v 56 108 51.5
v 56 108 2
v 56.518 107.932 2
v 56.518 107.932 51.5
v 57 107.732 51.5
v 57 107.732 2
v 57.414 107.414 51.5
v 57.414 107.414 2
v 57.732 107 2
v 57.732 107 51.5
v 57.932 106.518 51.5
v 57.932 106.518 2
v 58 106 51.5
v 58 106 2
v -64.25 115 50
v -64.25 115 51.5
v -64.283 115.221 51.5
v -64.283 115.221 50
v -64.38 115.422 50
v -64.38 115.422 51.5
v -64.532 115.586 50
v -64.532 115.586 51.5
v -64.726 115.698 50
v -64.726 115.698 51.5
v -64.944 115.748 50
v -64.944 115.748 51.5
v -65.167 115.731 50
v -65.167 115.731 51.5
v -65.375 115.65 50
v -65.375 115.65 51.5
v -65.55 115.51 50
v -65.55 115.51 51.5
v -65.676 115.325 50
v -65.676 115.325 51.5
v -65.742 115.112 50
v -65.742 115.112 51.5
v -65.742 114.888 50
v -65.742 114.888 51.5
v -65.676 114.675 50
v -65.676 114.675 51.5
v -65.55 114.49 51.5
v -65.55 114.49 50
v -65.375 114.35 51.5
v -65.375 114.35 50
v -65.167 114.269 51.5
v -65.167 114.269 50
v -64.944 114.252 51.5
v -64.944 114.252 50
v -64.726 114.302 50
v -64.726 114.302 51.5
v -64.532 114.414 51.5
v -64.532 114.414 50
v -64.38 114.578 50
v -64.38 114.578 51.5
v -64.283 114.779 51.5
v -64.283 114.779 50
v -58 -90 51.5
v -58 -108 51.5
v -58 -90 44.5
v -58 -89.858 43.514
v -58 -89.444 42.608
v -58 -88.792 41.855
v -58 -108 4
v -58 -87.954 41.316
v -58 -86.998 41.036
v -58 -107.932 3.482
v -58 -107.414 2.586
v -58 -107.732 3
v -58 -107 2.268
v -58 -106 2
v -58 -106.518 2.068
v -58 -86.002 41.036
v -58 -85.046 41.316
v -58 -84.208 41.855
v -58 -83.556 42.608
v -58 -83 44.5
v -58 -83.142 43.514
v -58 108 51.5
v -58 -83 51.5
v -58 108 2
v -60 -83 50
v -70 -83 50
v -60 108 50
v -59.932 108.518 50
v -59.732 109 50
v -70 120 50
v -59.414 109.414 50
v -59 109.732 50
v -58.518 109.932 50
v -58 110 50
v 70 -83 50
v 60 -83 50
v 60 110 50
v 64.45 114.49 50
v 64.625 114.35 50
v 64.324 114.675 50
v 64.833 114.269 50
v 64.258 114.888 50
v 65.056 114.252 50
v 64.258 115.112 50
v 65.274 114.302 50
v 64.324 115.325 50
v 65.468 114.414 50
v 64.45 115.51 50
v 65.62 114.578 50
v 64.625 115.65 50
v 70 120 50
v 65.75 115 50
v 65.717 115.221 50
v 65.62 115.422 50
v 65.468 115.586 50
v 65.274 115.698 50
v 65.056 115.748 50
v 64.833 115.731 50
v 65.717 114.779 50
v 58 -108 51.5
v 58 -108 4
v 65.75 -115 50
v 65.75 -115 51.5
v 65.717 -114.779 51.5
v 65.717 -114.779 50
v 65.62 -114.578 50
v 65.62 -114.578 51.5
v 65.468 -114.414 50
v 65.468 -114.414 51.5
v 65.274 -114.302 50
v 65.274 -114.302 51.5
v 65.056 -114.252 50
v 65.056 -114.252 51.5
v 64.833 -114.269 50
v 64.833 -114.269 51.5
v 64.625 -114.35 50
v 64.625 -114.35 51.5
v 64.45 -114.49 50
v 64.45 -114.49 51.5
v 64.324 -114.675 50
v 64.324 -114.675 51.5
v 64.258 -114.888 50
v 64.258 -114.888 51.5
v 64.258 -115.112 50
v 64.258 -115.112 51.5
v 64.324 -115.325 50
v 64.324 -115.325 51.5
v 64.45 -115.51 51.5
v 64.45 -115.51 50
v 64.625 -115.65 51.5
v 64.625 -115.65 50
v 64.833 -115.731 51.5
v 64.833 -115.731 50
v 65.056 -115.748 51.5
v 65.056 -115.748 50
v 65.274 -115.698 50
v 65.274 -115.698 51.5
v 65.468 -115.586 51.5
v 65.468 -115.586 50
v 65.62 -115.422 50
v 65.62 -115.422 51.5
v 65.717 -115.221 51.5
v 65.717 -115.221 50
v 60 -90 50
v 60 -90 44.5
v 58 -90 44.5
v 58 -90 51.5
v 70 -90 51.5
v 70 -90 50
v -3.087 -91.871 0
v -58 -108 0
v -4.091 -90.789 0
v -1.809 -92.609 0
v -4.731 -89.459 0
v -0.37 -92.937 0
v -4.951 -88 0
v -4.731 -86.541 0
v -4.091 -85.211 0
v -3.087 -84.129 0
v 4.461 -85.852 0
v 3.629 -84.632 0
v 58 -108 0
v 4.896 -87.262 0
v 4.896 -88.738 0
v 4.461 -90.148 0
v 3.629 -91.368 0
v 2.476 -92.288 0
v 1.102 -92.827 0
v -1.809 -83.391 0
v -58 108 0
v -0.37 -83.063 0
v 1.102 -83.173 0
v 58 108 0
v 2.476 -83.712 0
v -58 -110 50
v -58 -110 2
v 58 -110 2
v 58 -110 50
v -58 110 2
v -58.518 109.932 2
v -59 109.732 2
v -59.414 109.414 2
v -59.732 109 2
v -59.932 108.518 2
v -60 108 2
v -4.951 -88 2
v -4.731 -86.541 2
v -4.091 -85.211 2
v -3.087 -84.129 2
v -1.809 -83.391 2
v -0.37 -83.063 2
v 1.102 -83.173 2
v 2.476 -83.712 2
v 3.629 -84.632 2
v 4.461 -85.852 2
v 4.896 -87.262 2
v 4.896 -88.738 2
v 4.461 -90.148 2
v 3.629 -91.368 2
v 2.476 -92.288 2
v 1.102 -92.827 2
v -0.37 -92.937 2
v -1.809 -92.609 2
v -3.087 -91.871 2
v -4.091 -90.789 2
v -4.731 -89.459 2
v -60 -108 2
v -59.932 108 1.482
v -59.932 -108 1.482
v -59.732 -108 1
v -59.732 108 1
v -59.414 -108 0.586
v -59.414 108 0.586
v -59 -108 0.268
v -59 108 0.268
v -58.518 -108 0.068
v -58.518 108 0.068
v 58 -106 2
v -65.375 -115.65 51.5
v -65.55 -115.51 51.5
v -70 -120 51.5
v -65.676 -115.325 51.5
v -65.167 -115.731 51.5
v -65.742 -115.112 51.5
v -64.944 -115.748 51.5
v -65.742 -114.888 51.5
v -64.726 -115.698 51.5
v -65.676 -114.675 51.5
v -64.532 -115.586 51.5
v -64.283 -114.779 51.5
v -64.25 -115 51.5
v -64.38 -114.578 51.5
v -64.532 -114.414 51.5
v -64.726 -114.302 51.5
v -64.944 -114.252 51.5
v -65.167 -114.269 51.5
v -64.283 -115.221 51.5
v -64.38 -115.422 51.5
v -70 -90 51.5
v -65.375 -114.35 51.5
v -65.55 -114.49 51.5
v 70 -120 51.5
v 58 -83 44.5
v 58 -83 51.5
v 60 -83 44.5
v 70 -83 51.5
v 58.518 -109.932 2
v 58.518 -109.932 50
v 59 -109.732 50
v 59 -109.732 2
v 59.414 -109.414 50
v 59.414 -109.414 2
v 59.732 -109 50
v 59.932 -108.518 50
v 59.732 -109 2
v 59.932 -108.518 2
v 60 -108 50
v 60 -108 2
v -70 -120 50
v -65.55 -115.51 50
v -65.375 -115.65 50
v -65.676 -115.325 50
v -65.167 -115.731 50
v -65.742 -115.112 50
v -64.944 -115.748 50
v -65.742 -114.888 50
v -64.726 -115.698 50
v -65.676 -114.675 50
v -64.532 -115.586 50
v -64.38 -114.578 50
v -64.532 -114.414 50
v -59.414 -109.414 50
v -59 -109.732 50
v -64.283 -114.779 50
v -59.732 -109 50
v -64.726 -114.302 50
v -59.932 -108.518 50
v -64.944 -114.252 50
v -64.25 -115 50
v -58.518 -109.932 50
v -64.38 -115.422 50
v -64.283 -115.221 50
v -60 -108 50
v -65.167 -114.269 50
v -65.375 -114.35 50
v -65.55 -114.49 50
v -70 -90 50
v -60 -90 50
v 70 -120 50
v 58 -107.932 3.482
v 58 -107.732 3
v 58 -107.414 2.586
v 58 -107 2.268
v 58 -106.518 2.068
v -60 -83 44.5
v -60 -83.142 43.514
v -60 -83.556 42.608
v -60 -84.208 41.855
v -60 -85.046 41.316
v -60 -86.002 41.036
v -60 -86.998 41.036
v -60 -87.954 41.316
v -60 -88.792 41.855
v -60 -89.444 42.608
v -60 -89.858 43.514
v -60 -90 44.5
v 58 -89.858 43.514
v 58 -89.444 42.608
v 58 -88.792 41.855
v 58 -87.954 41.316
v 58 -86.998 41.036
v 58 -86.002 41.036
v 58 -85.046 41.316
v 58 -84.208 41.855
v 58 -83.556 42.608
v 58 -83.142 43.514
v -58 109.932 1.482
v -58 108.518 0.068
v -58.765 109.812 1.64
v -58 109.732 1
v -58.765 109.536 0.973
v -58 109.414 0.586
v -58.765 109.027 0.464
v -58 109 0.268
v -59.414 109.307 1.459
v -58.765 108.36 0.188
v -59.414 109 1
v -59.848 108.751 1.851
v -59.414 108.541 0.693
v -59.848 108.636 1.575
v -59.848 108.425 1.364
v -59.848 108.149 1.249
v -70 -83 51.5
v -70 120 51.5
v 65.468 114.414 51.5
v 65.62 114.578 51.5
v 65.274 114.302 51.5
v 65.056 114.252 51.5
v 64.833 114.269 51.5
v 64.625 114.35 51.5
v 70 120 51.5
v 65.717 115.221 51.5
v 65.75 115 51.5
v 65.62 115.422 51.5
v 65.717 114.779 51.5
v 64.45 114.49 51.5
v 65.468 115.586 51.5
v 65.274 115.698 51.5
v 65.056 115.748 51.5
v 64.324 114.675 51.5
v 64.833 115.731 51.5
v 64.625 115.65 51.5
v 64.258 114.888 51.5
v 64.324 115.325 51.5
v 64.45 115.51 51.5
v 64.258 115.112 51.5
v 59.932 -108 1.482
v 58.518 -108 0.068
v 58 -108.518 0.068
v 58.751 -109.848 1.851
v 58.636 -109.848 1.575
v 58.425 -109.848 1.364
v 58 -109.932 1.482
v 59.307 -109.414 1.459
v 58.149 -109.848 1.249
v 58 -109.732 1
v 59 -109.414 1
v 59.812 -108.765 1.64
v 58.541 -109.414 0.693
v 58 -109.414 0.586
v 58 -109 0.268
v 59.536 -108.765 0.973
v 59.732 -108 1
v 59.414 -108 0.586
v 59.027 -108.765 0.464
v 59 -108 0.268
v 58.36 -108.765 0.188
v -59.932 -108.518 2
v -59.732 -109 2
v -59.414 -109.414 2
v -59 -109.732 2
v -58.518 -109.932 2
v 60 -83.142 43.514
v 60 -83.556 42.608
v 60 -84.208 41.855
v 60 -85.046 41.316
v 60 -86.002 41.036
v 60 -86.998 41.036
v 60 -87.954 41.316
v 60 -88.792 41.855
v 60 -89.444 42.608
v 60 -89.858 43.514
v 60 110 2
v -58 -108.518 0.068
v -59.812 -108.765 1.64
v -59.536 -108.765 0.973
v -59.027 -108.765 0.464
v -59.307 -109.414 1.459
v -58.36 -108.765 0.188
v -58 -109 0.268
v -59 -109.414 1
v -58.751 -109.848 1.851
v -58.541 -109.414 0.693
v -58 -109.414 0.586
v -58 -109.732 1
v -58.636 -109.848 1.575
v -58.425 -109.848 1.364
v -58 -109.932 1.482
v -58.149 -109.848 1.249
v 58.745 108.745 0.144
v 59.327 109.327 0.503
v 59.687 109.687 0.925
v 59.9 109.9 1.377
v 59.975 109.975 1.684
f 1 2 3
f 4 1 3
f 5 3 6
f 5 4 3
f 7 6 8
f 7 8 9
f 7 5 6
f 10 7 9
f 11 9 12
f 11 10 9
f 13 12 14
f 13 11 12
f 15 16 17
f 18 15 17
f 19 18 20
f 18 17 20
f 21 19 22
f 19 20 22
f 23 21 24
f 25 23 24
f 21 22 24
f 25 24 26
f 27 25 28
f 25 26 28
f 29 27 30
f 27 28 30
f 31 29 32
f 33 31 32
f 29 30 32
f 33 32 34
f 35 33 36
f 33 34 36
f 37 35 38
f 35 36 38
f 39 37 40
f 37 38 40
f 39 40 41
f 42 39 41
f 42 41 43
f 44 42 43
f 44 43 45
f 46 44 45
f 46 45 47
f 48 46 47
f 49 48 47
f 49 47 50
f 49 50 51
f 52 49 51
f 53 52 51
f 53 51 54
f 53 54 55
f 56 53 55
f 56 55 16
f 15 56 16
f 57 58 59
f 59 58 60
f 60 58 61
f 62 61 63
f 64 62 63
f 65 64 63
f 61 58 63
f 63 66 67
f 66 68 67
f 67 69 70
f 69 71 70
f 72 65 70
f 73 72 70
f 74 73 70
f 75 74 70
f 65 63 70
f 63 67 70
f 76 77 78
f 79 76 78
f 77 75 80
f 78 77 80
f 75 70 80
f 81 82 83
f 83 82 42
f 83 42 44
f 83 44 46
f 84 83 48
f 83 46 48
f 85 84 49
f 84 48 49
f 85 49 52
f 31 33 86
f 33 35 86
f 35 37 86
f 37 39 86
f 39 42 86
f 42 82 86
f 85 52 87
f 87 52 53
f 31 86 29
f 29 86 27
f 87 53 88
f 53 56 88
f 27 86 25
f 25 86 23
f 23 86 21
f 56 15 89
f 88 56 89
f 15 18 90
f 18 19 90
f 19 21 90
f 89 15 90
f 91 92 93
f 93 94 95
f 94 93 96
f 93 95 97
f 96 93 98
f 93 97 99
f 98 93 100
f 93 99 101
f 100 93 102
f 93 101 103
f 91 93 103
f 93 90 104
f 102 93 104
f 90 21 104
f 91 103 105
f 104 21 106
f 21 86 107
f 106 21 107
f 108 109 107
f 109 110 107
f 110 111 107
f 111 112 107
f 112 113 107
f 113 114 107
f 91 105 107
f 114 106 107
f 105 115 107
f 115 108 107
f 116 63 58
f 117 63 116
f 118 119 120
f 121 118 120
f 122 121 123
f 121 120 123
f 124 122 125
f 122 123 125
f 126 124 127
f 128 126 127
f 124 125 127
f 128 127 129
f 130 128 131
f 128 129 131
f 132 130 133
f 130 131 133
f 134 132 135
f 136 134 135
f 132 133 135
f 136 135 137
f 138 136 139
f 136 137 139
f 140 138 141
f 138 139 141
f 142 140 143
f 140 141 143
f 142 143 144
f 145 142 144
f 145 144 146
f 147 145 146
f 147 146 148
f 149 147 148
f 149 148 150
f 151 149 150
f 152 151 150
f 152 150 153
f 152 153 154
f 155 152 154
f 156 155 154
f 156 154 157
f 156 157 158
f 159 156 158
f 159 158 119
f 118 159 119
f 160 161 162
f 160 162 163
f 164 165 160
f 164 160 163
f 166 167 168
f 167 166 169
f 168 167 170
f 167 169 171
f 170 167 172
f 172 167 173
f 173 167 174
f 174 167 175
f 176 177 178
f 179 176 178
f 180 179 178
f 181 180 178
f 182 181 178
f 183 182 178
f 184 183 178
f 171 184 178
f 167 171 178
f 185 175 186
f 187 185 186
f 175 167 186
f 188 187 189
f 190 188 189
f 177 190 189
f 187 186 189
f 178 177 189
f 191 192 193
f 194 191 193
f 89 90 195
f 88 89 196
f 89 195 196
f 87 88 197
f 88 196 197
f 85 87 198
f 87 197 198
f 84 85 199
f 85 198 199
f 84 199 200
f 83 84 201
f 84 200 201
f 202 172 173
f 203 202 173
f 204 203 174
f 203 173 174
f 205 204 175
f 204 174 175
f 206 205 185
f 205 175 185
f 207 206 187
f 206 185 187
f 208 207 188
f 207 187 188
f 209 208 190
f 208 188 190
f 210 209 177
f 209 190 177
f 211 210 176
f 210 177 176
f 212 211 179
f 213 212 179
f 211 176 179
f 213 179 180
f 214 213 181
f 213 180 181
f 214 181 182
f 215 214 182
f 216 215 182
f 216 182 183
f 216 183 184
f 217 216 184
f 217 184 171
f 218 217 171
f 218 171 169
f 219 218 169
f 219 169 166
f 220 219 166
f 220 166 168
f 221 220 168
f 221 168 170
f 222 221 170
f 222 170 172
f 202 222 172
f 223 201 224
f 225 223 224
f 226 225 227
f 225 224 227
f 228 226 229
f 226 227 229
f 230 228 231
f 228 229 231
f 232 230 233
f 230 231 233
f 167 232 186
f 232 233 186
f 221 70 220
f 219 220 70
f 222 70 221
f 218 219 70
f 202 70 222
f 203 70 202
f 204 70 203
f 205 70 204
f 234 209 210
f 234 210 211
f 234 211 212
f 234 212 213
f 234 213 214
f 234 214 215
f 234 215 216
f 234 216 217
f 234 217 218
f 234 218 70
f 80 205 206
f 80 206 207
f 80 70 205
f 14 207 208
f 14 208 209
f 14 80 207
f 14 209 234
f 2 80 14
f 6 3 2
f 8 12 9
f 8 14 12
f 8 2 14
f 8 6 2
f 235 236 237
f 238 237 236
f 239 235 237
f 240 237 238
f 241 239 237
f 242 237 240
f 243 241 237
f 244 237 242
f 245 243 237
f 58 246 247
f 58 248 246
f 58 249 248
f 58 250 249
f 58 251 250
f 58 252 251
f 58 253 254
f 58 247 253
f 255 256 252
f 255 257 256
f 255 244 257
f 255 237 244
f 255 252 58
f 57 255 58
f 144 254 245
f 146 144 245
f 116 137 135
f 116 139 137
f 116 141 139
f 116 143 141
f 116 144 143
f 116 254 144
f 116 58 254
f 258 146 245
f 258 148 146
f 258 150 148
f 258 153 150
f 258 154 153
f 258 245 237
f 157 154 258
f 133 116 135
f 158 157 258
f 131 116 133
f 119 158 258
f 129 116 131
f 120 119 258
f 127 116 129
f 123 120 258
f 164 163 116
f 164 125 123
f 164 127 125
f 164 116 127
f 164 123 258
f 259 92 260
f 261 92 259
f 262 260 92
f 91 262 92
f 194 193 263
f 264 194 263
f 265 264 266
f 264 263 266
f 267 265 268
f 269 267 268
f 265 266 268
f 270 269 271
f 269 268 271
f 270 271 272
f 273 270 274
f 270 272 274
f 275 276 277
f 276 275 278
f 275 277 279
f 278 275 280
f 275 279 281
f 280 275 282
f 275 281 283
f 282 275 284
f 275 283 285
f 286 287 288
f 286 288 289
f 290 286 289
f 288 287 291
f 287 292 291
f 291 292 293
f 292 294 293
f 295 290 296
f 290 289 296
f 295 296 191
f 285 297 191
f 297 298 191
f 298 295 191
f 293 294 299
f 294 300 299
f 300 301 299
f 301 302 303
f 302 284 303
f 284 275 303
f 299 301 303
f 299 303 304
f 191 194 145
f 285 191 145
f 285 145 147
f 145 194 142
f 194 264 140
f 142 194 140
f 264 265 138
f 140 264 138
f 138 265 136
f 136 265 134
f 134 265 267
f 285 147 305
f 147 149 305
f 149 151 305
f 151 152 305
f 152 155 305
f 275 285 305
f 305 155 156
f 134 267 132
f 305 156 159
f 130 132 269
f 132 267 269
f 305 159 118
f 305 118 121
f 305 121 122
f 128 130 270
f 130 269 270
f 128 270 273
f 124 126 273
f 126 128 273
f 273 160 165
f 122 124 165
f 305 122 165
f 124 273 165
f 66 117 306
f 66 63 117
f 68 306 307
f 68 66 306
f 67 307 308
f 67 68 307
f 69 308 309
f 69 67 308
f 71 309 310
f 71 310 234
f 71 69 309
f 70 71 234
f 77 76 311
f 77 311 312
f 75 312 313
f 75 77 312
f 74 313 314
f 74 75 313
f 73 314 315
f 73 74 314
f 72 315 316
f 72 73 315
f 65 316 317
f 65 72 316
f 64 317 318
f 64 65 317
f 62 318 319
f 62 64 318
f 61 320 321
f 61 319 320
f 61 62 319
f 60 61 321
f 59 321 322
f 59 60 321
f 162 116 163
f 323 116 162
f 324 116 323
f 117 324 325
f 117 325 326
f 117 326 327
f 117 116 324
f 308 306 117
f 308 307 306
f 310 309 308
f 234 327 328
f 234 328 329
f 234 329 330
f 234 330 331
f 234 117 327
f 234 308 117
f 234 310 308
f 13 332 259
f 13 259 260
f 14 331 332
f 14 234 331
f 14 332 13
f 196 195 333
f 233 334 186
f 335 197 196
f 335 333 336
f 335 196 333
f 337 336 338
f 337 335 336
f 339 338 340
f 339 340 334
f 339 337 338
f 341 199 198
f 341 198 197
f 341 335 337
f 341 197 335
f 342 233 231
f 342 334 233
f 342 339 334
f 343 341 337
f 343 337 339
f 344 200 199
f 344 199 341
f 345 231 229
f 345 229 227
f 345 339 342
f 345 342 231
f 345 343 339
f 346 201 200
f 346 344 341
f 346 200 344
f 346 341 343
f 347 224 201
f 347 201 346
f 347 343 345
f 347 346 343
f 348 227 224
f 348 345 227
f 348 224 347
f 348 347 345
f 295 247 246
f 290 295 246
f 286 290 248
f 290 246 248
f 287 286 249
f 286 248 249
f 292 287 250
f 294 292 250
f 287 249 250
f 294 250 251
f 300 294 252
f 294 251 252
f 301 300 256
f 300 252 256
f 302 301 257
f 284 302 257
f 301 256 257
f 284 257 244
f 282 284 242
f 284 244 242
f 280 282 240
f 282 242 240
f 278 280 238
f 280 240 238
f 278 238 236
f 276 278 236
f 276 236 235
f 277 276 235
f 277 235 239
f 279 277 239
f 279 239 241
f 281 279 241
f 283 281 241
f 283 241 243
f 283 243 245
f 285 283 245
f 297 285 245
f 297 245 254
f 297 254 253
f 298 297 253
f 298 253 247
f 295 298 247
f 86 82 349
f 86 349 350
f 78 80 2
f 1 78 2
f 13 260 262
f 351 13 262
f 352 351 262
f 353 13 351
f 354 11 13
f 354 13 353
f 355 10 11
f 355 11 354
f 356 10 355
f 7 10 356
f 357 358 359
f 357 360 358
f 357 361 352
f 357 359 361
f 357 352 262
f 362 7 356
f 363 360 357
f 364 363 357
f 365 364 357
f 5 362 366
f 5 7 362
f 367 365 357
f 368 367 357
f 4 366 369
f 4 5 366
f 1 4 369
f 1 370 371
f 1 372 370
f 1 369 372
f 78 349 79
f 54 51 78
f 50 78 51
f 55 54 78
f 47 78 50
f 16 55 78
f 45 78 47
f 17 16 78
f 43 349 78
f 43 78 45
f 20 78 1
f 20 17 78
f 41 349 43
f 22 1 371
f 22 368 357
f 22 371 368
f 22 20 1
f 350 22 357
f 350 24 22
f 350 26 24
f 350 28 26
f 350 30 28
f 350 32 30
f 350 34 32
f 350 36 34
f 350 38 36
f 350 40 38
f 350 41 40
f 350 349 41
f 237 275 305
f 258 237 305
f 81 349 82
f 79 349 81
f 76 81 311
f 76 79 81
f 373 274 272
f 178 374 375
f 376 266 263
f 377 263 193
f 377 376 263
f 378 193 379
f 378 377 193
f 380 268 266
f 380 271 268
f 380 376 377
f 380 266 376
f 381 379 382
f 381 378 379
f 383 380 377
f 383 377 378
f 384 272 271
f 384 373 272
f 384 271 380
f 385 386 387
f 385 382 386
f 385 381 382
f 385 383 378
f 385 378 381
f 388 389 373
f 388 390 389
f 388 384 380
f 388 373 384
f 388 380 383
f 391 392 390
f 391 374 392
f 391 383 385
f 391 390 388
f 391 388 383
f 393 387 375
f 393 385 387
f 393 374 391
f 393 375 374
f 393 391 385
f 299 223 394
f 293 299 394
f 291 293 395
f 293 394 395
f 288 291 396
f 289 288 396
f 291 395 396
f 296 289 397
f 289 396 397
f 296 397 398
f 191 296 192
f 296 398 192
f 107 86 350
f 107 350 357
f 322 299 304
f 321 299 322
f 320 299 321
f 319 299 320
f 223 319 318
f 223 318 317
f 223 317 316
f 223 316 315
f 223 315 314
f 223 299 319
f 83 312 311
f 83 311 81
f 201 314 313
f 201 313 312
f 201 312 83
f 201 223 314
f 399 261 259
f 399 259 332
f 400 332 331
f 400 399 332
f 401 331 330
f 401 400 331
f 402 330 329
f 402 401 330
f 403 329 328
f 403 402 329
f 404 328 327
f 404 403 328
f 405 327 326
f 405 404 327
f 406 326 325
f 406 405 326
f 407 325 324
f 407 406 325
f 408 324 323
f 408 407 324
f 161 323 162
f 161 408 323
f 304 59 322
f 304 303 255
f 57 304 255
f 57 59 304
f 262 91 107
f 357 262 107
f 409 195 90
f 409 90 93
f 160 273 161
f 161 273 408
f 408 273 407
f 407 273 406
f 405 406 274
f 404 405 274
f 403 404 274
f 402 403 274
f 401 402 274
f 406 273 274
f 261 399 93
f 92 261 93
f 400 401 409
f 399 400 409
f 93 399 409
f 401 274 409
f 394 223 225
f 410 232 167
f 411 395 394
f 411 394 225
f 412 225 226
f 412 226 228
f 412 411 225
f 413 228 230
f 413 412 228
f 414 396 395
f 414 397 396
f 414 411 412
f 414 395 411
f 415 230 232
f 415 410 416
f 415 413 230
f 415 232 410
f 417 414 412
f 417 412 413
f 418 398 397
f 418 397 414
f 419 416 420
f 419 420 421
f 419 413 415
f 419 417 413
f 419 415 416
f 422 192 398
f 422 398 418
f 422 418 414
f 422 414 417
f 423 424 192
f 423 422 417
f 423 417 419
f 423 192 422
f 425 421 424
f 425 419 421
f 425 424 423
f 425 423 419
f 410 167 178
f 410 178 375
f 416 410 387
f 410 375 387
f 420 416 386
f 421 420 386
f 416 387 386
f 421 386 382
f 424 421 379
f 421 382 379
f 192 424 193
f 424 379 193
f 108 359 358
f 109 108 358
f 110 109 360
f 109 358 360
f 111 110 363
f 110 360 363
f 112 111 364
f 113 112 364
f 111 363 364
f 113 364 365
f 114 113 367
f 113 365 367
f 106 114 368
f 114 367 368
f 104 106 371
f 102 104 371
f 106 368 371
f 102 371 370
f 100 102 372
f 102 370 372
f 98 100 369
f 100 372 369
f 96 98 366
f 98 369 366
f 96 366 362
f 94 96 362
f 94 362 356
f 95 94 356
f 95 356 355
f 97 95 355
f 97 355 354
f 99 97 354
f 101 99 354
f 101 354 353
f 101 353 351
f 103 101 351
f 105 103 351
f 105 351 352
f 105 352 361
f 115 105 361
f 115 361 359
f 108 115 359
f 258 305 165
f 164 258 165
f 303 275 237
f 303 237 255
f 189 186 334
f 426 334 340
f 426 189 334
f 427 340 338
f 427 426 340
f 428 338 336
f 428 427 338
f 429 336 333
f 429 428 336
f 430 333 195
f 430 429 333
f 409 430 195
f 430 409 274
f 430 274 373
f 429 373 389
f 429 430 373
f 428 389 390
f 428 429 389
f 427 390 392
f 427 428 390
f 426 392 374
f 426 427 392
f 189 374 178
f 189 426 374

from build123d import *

# Parameters (mm, degrees)
SKETCH1_W               = 120
SKETCH1_H               = 220
BOSS_EXTRUDE1_DEPTH     = 50
SKETCH2_W               = 140
SKETCH2_H               = 240
BOSS_EXTRUDE2_DEPTH     = 1.5
SHELL1_T                = 2
CUT_EXTRUDE1_DEPTH      = 183.855817518
CUT_EXTRUDE1_DEPTH_BACK = 183.855817518
FILLET1_R               = 2
FILLET2_R               = 2
SKETCH9_R               = 4.951117386
CUT_EXTRUDE2_DEPTH      = 149.162917088
F_1_5MM_DOWEL_HOLE1_D   = 1.5


with BuildPart() as part:
    # Sketch1 → Boss-Extrude1 (new body)
    with BuildSketch(Plane.XY):
        Rectangle(SKETCH1_W, SKETCH1_H)
    extrude(amount=BOSS_EXTRUDE1_DEPTH)

    # Sketch2 → Boss-Extrude2 (add)
    with BuildSketch(Plane.XY.offset(50)):
        Rectangle(SKETCH2_W, SKETCH2_H)
    extrude(amount=BOSS_EXTRUDE2_DEPTH)

    # Shell1
    # the kernel refuses this shell: the inside is offset whole and opened at the faces by hand
    shell1_offset = offset(amount=-SHELL1_T, mode=Mode.PRIVATE)
    shell1_offset = shell1_offset + extrude(shell1_offset.faces().sort_by_distance((0, 0, 49.5))[0], amount=SHELL1_T, mode=Mode.PRIVATE)
    add(shell1_offset, mode=Mode.SUBTRACT)

    # Sketch8 → Cut-Extrude1 (cut, two sides: drawn at the far end of the back side and taken through both)
    with BuildSketch(Plane.ZY.offset(-58).offset(-CUT_EXTRUDE1_DEPTH_BACK)):
        with BuildLine():
            Line((51.5, -83), (44.5, -83))
            ThreePointArc((44.5, -83), (41, -86.5), (44.5, -90))
            Line((44.5, -90), (51.5, -90))
            Line((51.5, -90), (51.5, -83))
        make_face()
    extrude(amount=CUT_EXTRUDE1_DEPTH + CUT_EXTRUDE1_DEPTH_BACK, mode=Mode.SUBTRACT)

    # Fillet1
    fillet1_edges = [part.edges().sort_by_distance(p)[0] for p in [
        (0, -108, 2),
        (-60, 0, 0),
        (0, 110, 0),
        (60, 0, 0),
    ]]
    fillet(fillet1_edges, radius=FILLET1_R)

    # Fillet2
    # the kernel refuses this fillet: 2 mm, written as the material it adds along each edge
    with BuildSketch(Plane(origin=(58, 108, 51.5), x_dir=(0, -1, 0), z_dir=(0, 0, -1))) as fillet2_piece_1:
        with BuildLine():
            CenterArc((FILLET2_R, FILLET2_R), FILLET2_R, 180, 90)
            Line((0, FILLET2_R), (0, 0))
            Line((0, 0), (FILLET2_R, 0))
        make_face()
    extrude(amount=49.5)
    # the kernel refuses this fillet: 2 mm, written as the material it takes off along each edge
    with BuildSketch(Plane(origin=(-58, 108, 2), x_dir=(0, 1, 0), z_dir=(-1, 0, 0))) as fillet2_2_piece_1_section:
        Polygon((0, 0), (FILLET2_R * 1.02, 0), (FILLET2_R * 1.02, FILLET2_R * 1.02), (0, FILLET2_R * 1.02), align=None)
    fillet2_2_piece_1 = extrude(amount=FILLET2_R * 1.02, mode=Mode.PRIVATE)
    fillet2_2_piece_1 = fillet2_2_piece_1 - Plane(origin=(-58, 108, 2), x_dir=(0, -0.7071067811865475, 0.7071067811865475), z_dir=(-1, 0, 0)) * Sphere(FILLET2_R, mode=Mode.PRIVATE)
    add(fillet2_2_piece_1, mode=Mode.SUBTRACT)
    with BuildSketch(Plane(origin=(60, -110, 2), x_dir=(-1, 0, 0), z_dir=(0, 0, 1)), Plane(origin=(-60, -110, 2), x_dir=(0, 1, 0), z_dir=(0, 0, 1))) as fillet2_2_piece_2:
        with BuildLine():
            CenterArc((FILLET2_R, -FILLET2_R), FILLET2_R, 90, 90)
            Line((0, -FILLET2_R), (0, 0))
            Line((0, 0), (FILLET2_R, 0))
        make_face()
    extrude(amount=48, mode=Mode.SUBTRACT)
    with BuildSketch(Plane(origin=(-60, 110, 2), x_dir=(0, -1, 0), z_dir=(0, 0, 1))) as fillet2_2_piece_3:
        with BuildLine():
            CenterArc((FILLET2_R, FILLET2_R), FILLET2_R, 180, 90)
            Line((0, FILLET2_R), (0, 0))
            Line((0, 0), (FILLET2_R, 0))
        make_face()
    extrude(amount=48, mode=Mode.SUBTRACT)
    with BuildSketch(Plane(origin=(58, -110, 0), x_dir=(0, 0, 1), z_dir=(-1, 0, 0))) as fillet2_2_piece_4:
        with BuildLine():
            CenterArc((FILLET2_R, FILLET2_R), FILLET2_R, 180, 90)
            Line((0, FILLET2_R), (0, 0))
            Line((0, 0), (FILLET2_R, 0))
        make_face()
    extrude(amount=116, mode=Mode.SUBTRACT)
    with BuildSketch(Plane(origin=(58, -110, 2), x_dir=(1, 0, 0), z_dir=(0, 0, 1))) as fillet2_2_piece_5:
        with BuildLine():
            CenterArc((2 - FILLET2_R, FILLET2_R), FILLET2_R, 270, 90)
            Line((2, FILLET2_R), (2, 0))
            Line((2, 0), (2 - FILLET2_R, 0))
        make_face()
    revolve(axis=Axis((58, -110, 2), (0, 1, 0)), revolution_arc=90, mode=Mode.SUBTRACT)
    with BuildSketch(Plane(origin=(-58, -110, 2), x_dir=(-1, 0, 0), z_dir=(0, 0, 1))) as fillet2_2_piece_6:
        with BuildLine():
            CenterArc((2 - FILLET2_R, -FILLET2_R), FILLET2_R, 0, 90)
            Line((2 - FILLET2_R, 0), (2, 0))
            Line((2, 0), (2, -FILLET2_R))
        make_face()
    revolve(axis=Axis((-58, -110, 2), (0, -1, 0)), revolution_arc=90, mode=Mode.SUBTRACT)

    # Sketch9 → Cut-Extrude2 (cut, through all)
    with BuildSketch(Plane(origin=(0, 0, 0), x_dir=(-1, 0, 0), z_dir=(0, 0, -1))):
        with Locations((0, -88)):
            Circle(SKETCH9_R)
    extrude(amount=-CUT_EXTRUDE2_DEPTH, mode=Mode.SUBTRACT)

    # Ø1.5mm Dowel Hole1 (through all)
    with Locations(Plane(origin=(-164.627139737, -264.125226739, 50), x_dir=(-1, 0, 0), z_dir=(0, 0, -1))):
        with Locations((-229.627139737, 379.125226739), (-99.627139737, 379.125226739), (-229.627139737, 149.125226739), (-99.627139737, 149.125226739)):
            Hole(F_1_5MM_DOWEL_HOLE1_D / 2)


solid = part.part
